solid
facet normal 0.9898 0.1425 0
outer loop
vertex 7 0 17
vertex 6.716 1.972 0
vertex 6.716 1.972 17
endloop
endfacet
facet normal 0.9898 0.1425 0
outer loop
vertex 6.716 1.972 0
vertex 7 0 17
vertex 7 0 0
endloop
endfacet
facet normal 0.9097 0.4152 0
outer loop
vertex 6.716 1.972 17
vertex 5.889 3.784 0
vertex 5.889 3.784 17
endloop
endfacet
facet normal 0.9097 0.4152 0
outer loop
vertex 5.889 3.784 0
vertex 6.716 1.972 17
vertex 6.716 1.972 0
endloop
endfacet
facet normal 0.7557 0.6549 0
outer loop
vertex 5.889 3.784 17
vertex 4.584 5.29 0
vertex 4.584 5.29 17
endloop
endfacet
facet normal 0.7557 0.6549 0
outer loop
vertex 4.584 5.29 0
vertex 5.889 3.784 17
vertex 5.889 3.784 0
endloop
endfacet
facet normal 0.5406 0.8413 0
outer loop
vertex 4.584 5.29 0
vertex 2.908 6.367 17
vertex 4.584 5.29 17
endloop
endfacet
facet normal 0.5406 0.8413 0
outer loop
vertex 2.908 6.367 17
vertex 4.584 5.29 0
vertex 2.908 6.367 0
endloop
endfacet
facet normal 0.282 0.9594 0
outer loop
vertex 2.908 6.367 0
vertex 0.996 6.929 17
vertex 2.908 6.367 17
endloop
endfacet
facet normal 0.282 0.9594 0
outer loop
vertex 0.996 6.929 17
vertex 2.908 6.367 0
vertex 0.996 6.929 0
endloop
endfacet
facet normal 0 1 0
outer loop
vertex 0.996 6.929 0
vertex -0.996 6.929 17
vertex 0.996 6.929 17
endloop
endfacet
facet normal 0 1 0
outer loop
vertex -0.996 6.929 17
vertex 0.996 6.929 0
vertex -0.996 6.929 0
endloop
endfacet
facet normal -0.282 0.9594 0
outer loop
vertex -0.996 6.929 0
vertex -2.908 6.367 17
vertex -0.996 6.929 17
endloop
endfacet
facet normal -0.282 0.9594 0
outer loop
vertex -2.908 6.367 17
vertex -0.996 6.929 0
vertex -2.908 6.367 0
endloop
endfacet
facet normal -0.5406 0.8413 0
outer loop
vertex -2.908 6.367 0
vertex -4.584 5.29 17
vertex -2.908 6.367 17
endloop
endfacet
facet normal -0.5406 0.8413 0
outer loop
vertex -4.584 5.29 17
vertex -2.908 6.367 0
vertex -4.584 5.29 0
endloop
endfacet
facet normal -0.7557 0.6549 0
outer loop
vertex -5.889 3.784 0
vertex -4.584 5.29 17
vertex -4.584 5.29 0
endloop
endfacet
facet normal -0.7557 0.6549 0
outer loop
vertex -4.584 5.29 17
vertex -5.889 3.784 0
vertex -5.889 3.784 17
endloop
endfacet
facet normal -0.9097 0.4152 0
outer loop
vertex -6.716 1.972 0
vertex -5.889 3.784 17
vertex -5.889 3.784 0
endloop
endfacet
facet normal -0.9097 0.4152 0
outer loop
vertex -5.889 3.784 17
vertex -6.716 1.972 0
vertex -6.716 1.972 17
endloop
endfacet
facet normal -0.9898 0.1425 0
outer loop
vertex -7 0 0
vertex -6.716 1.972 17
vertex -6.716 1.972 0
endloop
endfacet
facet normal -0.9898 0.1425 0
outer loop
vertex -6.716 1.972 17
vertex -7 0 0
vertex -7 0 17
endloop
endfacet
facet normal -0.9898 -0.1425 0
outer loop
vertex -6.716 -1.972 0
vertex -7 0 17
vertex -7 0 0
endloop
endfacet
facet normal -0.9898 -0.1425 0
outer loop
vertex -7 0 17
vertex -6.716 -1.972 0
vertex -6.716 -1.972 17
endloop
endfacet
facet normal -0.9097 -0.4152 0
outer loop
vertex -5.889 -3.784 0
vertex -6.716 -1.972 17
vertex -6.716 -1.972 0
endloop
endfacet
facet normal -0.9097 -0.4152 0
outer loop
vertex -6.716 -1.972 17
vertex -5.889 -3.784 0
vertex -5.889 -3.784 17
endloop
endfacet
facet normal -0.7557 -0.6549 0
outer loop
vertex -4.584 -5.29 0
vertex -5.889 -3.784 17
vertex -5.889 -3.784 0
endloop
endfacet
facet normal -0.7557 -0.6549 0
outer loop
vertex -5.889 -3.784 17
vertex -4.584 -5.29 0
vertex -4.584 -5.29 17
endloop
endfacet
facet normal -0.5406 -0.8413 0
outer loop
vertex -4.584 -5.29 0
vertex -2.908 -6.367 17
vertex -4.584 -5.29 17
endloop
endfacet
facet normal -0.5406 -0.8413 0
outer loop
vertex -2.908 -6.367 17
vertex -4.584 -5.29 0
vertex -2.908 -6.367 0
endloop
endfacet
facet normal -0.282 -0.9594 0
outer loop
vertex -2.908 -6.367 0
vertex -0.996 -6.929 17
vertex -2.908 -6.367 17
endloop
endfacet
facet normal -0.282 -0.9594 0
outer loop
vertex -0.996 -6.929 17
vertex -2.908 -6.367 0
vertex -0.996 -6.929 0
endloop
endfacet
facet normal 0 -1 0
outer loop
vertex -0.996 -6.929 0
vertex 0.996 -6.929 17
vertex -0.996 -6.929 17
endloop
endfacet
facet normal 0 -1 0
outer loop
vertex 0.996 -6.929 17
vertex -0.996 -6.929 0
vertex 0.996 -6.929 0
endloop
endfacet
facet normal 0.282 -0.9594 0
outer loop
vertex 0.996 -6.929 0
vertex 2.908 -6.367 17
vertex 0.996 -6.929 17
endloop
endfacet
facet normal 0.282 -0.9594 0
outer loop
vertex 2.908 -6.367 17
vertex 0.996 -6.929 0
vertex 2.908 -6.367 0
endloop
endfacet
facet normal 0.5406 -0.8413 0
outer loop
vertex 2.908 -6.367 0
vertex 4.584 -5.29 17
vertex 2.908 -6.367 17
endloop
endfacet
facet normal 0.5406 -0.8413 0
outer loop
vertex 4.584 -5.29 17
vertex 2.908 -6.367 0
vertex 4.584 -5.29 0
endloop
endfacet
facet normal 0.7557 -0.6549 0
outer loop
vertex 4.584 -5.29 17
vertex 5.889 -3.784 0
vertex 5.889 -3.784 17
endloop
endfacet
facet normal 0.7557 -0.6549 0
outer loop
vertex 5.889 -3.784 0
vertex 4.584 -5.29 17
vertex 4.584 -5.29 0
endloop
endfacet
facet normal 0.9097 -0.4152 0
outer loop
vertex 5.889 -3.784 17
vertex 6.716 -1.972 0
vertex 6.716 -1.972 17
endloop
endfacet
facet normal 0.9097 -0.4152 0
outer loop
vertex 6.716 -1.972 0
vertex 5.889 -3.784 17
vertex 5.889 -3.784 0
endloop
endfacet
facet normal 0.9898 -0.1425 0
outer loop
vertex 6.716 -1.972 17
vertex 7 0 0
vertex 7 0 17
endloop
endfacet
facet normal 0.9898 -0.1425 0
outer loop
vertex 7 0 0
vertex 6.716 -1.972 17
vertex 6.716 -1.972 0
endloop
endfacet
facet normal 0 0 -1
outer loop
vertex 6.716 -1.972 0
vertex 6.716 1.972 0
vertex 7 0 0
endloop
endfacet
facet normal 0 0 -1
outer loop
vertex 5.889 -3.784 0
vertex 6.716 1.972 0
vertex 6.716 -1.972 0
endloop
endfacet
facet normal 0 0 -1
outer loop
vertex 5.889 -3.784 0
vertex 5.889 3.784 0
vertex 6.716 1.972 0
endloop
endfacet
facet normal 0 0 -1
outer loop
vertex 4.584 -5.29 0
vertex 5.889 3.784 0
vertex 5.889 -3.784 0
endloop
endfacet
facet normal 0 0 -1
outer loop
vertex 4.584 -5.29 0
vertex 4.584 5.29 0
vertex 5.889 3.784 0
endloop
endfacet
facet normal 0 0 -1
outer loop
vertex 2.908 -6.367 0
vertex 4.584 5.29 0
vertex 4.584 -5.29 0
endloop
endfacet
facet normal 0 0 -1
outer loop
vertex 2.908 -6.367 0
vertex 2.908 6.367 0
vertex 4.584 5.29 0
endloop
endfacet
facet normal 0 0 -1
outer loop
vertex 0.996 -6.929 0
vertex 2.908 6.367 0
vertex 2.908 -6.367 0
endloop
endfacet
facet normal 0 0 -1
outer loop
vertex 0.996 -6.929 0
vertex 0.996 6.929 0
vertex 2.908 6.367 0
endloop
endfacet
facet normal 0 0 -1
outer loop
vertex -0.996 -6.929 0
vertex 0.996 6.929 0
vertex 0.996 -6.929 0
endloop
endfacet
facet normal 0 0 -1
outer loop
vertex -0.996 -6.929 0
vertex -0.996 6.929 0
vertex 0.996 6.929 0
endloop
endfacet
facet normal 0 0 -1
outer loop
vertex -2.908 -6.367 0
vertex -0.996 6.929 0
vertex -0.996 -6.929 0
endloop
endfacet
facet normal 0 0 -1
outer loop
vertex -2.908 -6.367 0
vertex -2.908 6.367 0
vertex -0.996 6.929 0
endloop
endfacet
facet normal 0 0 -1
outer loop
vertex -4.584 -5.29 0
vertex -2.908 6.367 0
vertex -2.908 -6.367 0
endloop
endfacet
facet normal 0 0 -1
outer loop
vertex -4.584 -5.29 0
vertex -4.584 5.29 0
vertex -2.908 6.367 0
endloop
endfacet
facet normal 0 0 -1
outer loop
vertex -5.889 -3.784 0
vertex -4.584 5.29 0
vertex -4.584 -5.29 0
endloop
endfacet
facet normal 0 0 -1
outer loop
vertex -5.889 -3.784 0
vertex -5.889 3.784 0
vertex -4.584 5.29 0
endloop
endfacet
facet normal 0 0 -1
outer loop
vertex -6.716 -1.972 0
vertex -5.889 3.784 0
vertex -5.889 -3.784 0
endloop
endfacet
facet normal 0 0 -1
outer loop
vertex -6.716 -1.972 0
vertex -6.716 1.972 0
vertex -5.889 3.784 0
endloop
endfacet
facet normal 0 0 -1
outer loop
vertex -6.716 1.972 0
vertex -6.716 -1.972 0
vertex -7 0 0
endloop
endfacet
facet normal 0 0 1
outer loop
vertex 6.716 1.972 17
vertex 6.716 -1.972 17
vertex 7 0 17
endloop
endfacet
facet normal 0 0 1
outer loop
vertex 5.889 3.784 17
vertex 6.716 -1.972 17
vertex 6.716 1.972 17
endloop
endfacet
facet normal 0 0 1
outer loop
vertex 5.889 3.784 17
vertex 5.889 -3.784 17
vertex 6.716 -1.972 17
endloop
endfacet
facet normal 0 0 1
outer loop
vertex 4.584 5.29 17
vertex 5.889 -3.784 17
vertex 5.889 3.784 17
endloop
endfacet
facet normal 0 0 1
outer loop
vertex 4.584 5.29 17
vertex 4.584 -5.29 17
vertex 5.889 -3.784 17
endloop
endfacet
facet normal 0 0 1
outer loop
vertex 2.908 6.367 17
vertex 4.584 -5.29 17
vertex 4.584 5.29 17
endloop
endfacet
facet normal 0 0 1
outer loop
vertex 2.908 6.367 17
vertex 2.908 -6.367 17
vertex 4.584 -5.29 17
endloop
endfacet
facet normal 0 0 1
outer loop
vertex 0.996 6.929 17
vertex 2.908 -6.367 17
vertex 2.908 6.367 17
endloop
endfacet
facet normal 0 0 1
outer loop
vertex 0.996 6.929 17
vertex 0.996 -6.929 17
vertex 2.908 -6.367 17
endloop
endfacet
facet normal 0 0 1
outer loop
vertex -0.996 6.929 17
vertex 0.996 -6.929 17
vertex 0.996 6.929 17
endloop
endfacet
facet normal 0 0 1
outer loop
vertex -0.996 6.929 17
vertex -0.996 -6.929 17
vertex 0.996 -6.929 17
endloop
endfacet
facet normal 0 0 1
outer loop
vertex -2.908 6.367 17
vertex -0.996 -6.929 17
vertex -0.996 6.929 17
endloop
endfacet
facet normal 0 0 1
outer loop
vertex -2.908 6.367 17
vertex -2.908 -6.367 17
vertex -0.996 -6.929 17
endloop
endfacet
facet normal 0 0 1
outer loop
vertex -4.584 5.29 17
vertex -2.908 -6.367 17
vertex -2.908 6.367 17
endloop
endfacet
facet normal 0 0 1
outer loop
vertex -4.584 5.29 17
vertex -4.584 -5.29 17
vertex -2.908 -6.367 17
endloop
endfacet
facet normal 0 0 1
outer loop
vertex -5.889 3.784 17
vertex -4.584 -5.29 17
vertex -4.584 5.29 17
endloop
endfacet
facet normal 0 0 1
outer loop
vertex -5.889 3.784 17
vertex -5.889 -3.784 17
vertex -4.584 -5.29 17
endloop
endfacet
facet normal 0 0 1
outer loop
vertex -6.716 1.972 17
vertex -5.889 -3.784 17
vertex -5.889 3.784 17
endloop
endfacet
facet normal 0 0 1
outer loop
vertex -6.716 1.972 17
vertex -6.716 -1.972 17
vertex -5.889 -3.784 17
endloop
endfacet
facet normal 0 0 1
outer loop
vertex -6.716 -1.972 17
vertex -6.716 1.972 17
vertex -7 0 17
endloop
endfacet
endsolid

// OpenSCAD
// Generated by SolidPython 1.0.1 on 2020-07-29 00:46:45


cylinder(h = 17, r1 = 7, r2 = 7);
/***********************************************
*********      SolidPython code:      **********
************************************************
 
# import packages: SolidPython
from solid import *
from solid.utils import *
from itertools import chain, combinations, permutations


class Resize:

    def __init__(self, scad_file):
        self.scad_file = scad_file
        #self.scad_file = import_scad(scad_file)
        # cone/cylinder param:
        self.r1 = 0
        self.r2 = 0
        self.h = 0
        # rectangular prism param:
        self.w = 0
        self.l = 0
        # ellipse param:
        self.r = 0

    # import OpenScad code (file name corresponds to shape)


    # classify shape + parameters
    def assign(self, param1, param2, param3):
        if self.scad_file == 'cone.scad':
            self.r1 = param1
            self.r2 = param2
            self.h = param3
        elif self.scad_file == 'cylinder.scad':
            self.r1 = param1
            self.r2 = param2
            self.h = param3
        elif self.scad_file == 'rectangularPrism.scad':
            self.h = param1
            self.l = param2
            self.w = param3
        else:
            self.r = param1
            self.h = param2

    # resize parameters
    def iterate(self):
        x = range(3, 20, 2)
        i = 1
        if self.scad_file == 'cone.scad':
            tempList = list(permutations(x, 2))
            for temp in tempList:
                param1 = temp[0]
                param2 = temp[1]
                filepath = 'produced_scad_files/' + 'cone' + str(param1) + '_' + str(param2) + '_' + '.scad'
                scad_render_to_file(cylinder(h=param1, r1=param2, r2=0), filepath)

        elif self.scad_file == 'cylinder.scad':
            tempList = list(permutations(x, 3))
            for temp in tempList:
                param1 = temp[0]
                param2 = temp[1]
                filepath = 'produced_scad_files/' + 'cylinder' + str(param1) + '_' + str(param2) + '_' + '.scad'
                scad_render_to_file(cylinder(h=param1, r1=param2, r2=param2), filepath)

        elif self.scad_file == 'rectangularPrism.scad':
            tempList = list(permutations(x, 3))
            for temp in tempList:
                param1 = temp[0]
                param2 = temp[1]
                param3 = temp[2]
                filepath = 'produced_scad_files/' + 'rectangularPrism' + str(param1) + '_' + str(param2) + '_' + str(
                    param3) + '.scad'
                scad_render_to_file(cube(size=(param1, param2, param3)), filepath)

        elif self.scad_file == 'ellipse.scad':
            tempList = list(permutations(x, 4))
            for temp in tempList:
                param1 = temp[0]
                param2 = temp[1]
                param3 = temp[2]
                param4 = temp[3]
                filepath = 'produced_scad_files/' + 'ellipse' + str(param1) + '_' + str(param2) + '_' + str(param3) + '_' + str(param4) + '.scad'
                scad_render_to_file(scale([param1, param2, param3])(sphere(r=param4)), filepath)

    def render_to_scadfile(self):
        scad_render_to_file(scad, 'example.scad') 
 
************************************************/
